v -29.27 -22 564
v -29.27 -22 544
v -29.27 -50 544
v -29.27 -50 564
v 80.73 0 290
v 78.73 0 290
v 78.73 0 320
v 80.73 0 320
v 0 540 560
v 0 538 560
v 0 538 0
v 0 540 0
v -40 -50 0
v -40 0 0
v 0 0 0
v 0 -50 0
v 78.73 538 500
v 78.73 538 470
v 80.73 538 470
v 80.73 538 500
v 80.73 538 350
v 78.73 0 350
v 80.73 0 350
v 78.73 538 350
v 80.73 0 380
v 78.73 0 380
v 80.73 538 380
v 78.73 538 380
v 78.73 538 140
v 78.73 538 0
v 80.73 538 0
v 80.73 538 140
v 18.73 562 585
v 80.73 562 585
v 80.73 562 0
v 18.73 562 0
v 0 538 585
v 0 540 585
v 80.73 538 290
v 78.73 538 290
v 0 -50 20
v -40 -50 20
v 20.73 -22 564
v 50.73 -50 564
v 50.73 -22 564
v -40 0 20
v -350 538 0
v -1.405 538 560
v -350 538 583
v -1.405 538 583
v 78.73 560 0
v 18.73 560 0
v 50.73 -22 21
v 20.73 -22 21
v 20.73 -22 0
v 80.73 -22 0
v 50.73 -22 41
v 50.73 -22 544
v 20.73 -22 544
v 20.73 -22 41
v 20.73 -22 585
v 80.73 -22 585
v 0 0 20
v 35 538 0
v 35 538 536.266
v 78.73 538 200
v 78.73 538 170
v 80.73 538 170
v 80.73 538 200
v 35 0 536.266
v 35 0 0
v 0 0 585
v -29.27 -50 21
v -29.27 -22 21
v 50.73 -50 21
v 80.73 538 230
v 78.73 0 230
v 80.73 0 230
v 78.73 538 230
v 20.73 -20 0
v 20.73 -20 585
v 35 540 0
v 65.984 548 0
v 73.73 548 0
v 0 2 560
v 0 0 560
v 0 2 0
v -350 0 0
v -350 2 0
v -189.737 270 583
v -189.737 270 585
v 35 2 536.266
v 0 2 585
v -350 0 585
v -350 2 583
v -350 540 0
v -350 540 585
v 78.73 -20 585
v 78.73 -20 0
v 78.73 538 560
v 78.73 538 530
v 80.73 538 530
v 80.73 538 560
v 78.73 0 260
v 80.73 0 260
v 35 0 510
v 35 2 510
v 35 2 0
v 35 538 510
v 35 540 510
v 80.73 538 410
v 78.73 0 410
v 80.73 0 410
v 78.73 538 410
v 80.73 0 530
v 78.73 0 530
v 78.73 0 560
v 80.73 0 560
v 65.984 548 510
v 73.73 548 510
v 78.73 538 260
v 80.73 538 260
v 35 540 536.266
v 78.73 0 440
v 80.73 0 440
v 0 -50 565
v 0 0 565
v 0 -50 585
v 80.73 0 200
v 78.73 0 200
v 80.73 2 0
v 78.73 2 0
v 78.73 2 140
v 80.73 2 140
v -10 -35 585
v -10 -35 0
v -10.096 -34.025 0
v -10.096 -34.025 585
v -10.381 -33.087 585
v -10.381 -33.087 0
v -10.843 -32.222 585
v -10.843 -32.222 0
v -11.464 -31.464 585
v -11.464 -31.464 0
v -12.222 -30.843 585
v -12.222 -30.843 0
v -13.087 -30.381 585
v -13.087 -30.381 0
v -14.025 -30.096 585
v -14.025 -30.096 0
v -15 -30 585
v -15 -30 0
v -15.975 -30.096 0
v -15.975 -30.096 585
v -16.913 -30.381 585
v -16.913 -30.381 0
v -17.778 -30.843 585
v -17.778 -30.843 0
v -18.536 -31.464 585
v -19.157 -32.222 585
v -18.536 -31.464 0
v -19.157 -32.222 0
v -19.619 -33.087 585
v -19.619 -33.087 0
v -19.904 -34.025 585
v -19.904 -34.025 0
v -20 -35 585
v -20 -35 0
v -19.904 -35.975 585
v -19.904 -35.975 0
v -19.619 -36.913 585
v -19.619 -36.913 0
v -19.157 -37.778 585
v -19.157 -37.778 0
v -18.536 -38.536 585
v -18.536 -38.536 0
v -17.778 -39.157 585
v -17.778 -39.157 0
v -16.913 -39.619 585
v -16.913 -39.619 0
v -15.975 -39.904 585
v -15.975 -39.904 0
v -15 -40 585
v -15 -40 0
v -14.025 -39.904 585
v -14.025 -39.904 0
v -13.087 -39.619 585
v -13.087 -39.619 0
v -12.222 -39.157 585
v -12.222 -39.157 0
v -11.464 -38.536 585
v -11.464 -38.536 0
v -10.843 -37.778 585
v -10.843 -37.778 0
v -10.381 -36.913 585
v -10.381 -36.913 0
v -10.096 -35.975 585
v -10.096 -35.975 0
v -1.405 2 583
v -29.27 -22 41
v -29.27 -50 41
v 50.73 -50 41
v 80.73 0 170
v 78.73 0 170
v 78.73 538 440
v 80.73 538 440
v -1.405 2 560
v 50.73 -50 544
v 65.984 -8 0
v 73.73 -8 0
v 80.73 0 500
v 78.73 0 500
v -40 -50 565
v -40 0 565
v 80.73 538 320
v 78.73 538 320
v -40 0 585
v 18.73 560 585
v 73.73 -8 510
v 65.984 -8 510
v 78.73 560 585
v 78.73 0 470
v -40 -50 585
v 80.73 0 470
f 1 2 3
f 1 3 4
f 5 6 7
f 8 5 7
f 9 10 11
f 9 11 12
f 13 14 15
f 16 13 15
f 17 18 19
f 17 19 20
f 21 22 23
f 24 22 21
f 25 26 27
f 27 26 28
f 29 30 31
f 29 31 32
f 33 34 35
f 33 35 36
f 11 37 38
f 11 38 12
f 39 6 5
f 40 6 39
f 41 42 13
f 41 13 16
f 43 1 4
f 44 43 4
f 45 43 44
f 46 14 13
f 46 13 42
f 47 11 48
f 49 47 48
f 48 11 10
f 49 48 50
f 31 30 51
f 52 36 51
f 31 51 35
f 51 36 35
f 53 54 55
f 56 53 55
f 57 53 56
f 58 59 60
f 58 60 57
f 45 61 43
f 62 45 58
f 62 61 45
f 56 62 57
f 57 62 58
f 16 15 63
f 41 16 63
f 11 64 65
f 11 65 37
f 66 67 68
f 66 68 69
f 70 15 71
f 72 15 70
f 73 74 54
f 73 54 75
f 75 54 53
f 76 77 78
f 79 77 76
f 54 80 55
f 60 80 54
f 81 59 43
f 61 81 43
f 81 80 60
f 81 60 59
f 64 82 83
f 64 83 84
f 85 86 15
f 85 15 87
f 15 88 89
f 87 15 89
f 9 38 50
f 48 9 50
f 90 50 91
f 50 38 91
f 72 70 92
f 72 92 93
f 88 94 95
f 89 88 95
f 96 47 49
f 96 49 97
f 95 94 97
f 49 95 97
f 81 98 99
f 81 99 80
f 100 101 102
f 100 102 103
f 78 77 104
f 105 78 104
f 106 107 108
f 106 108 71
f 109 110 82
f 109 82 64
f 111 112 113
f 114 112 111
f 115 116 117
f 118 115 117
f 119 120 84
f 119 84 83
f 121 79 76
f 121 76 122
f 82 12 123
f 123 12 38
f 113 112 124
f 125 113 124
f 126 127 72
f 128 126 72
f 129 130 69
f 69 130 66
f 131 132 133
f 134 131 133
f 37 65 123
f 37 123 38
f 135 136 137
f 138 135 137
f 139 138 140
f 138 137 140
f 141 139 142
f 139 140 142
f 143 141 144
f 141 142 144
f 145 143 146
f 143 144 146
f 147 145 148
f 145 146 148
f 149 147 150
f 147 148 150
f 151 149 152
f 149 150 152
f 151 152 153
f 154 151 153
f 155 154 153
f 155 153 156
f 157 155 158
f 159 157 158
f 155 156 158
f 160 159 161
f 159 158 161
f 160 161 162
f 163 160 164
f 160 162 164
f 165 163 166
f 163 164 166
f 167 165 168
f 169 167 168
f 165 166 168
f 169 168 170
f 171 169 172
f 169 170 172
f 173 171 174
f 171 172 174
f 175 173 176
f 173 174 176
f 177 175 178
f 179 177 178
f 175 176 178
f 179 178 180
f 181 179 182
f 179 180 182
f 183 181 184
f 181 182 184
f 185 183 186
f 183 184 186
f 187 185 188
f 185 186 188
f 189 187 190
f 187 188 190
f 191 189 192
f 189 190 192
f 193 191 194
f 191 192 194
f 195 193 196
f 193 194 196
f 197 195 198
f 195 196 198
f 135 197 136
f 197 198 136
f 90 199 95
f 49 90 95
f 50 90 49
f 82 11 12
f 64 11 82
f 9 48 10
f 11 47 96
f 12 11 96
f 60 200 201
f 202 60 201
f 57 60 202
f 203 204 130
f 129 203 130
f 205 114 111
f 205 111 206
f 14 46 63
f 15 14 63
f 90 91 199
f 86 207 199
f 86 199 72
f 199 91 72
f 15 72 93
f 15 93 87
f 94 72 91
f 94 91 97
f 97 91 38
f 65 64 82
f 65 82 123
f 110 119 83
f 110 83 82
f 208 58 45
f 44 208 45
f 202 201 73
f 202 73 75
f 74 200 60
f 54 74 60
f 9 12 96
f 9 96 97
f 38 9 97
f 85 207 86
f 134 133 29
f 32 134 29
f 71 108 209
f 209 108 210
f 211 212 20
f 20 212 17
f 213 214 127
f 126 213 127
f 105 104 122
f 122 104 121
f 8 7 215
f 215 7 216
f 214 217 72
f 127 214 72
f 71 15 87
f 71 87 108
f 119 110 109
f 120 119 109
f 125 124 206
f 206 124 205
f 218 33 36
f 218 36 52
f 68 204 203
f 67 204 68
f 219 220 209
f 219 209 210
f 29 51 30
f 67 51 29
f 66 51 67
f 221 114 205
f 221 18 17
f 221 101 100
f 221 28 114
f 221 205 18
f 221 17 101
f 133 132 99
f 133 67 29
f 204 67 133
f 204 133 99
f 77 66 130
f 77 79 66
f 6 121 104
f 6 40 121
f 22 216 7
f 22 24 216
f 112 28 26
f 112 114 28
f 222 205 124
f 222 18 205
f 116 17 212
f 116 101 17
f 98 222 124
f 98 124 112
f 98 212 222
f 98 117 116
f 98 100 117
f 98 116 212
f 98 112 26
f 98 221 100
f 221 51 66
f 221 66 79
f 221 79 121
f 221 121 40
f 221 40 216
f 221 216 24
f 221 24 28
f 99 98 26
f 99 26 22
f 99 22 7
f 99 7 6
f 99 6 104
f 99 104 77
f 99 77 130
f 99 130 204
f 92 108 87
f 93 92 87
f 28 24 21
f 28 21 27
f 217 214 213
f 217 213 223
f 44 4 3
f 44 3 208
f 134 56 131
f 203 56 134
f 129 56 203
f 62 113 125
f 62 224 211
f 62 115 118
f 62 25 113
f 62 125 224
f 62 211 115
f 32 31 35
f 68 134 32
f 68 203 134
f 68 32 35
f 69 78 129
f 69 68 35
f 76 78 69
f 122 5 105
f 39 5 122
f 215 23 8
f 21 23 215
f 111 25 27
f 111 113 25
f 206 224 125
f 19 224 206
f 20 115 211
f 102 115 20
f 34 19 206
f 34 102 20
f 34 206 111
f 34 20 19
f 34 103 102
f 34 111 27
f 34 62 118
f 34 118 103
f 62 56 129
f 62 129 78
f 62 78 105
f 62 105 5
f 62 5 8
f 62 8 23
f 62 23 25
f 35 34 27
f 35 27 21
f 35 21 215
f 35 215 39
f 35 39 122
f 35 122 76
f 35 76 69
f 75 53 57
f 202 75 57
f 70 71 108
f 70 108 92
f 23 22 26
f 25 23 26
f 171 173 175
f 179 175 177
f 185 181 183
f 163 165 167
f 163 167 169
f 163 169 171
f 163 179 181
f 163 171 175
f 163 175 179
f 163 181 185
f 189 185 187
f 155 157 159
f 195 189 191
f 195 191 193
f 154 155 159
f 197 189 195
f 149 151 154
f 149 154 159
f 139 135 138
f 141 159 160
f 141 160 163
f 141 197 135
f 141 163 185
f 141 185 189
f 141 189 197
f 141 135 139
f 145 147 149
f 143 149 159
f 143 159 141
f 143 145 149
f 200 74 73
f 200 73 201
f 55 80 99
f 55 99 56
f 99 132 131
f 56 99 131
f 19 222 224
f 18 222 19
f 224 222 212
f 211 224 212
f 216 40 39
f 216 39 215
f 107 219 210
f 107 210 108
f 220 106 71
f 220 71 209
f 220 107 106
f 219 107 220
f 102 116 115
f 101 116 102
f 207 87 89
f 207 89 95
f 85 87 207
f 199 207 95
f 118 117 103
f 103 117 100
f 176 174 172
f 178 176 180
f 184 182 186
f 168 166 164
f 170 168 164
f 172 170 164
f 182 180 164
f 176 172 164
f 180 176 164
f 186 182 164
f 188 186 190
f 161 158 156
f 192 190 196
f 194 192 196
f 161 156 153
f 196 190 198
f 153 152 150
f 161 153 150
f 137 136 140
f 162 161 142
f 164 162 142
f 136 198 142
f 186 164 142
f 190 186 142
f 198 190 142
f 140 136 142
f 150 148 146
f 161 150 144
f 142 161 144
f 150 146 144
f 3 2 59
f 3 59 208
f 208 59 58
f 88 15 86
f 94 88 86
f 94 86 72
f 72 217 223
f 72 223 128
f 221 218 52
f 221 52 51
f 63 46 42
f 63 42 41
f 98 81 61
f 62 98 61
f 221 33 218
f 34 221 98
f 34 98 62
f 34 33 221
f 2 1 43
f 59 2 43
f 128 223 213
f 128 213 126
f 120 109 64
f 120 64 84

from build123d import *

# Parameters (mm, degrees)
F0_W      = 540
F0_H      = 585
F1_DEPTH  = 350
F2_W      = 536
F2_H      = 583
F3_DEPTH  = 350
F5_DEPTH  = 25
F7_DEPTH  = 540
F8_W      = 536
F8_H      = 585
F9_DEPTH  = 35
F12_DEPTH = 510
F15_DEPTH = 585
F16_W     = 536
F16_H     = 140
F16_W_2   = 538
F16_H_2   = 30
F17_DEPTH = 100
F18_W     = 40
F18_H     = 20
F19_DEPTH = 50
F20_R     = 5
F21_DEPTH = 585
F22_W     = 80
F22_H     = 20
F23_DEPTH = 28


with BuildPart() as f1:
    # F0 (on Right) → F1 (new body)
    with BuildSketch(Plane.YZ):
        with Locations((270, 292.5)):
            Rectangle(F0_W, F0_H)
    extrude(amount=-F1_DEPTH)

    # F2 (on face) → F3 (cut)
    with BuildSketch(Plane.YZ):
        with Locations((270, 291.5)):
            Rectangle(F2_W, F2_H)
    extrude(amount=-F3_DEPTH, mode=Mode.SUBTRACT)

    # F4 (on face) → F5 (cut)
    with BuildSketch(Plane.XY.offset(585)):
        Polygon((-189.7366596101, 270), (0, 0), (0, 540), align=None)
    extrude(amount=-F5_DEPTH, mode=Mode.SUBTRACT)


with BuildPart() as f7:
    # F6 (on face) → F7 (new body)
    with BuildSketch(Plane.XZ):
        Polygon((0, 585), (0, 0), (35, 0), (35, 536.266028276), align=None)
    extrude(amount=-F7_DEPTH)

    # F8 (on face) → F9 (cut)
    with BuildSketch(Plane.YZ.offset(35)):
        with Locations((270, 292.5)):
            Rectangle(F8_W, F8_H)
    extrude(amount=-F9_DEPTH, mode=Mode.SUBTRACT)


with BuildPart() as f12:
    # F11 (on offset) → F12 (new body)
    with BuildSketch(Plane.XY.offset(510)):
        Polygon((35, 2), (35, 0), (65.9838667697, -8), (73.7298334621, -8), align=None)
    extrude(amount=-F12_DEPTH)


with BuildPart() as f12b:
    # F11 (on offset) → F12, piece 2 (new body)
    with BuildSketch(Plane.XY.offset(510)):
        Polygon((65.9838667697, 548), (35, 540), (35, 538), (73.7298334621, 548), align=None)
    extrude(amount=-F12_DEPTH)


with BuildPart() as f15:
    # F14 (on offset) → F15 (new body)
    with BuildSketch(Plane.XY.offset(585)):
        Polygon((78.7298334621, -20), (20.7298334621, -20), (20.7298334621, -22), (80.7298334621, -22), (80.7298334621, 562), (18.7298334621, 562), (18.7298334621, 560), (78.7298334621, 560), align=None)
    extrude(amount=-F15_DEPTH)

    # F16 (on Right) → F17 (cut)
    with BuildSketch(Plane.YZ):
        with Locations((270, 70)):
            Rectangle(F16_W, F16_H)
        with Locations((269, 185)):
            Rectangle(F16_W_2, F16_H_2)
        with Locations((269, 245)):
            Rectangle(F16_W_2, F16_H_2)
        with Locations((269, 305)):
            Rectangle(F16_W_2, F16_H_2)
        with Locations((269, 365)):
            Rectangle(F16_W_2, F16_H_2)
        with Locations((269, 545)):
            Rectangle(F16_W_2, F16_H_2)
        with Locations((269, 485)):
            Rectangle(F16_W_2, F16_H_2)
        with Locations((269, 425)):
            Rectangle(F16_W_2, F16_H_2)
    extrude(amount=F17_DEPTH, mode=Mode.SUBTRACT)

    # F22 (on face) → F23 (join)
    with BuildSketch(Plane.XZ.offset(22)):
        with Locations((10.7298334621, 554)):
            Rectangle(F22_W, F22_H)
        with Locations((10.7298334621, 31)):
            Rectangle(F22_W, F22_H)
    extrude(amount=F23_DEPTH)


with BuildPart() as f19:
    # F18 (on Front) → F19 (new body)
    with BuildSketch(Plane.XZ):
        with Locations((-20, 10)):
            Rectangle(F18_W, F18_H)
    extrude(amount=F19_DEPTH)


with BuildPart() as f19b:
    # F18 (on Front) → F19, piece 2 (new body)
    with BuildSketch(Plane.XZ):
        with Locations((-20, 575)):
            Rectangle(F18_W, F18_H)
    extrude(amount=F19_DEPTH)


with BuildPart() as f21:
    # F20 (on Top) → F21 (new body)
    with BuildSketch(Plane.XY):
        with Locations((-15, -35)):
            Circle(F20_R)
    extrude(amount=F21_DEPTH)


solid = Compound([f1.part, f7.part, f12.part, f12b.part, f15.part, f19.part, f19b.part, f21.part])
